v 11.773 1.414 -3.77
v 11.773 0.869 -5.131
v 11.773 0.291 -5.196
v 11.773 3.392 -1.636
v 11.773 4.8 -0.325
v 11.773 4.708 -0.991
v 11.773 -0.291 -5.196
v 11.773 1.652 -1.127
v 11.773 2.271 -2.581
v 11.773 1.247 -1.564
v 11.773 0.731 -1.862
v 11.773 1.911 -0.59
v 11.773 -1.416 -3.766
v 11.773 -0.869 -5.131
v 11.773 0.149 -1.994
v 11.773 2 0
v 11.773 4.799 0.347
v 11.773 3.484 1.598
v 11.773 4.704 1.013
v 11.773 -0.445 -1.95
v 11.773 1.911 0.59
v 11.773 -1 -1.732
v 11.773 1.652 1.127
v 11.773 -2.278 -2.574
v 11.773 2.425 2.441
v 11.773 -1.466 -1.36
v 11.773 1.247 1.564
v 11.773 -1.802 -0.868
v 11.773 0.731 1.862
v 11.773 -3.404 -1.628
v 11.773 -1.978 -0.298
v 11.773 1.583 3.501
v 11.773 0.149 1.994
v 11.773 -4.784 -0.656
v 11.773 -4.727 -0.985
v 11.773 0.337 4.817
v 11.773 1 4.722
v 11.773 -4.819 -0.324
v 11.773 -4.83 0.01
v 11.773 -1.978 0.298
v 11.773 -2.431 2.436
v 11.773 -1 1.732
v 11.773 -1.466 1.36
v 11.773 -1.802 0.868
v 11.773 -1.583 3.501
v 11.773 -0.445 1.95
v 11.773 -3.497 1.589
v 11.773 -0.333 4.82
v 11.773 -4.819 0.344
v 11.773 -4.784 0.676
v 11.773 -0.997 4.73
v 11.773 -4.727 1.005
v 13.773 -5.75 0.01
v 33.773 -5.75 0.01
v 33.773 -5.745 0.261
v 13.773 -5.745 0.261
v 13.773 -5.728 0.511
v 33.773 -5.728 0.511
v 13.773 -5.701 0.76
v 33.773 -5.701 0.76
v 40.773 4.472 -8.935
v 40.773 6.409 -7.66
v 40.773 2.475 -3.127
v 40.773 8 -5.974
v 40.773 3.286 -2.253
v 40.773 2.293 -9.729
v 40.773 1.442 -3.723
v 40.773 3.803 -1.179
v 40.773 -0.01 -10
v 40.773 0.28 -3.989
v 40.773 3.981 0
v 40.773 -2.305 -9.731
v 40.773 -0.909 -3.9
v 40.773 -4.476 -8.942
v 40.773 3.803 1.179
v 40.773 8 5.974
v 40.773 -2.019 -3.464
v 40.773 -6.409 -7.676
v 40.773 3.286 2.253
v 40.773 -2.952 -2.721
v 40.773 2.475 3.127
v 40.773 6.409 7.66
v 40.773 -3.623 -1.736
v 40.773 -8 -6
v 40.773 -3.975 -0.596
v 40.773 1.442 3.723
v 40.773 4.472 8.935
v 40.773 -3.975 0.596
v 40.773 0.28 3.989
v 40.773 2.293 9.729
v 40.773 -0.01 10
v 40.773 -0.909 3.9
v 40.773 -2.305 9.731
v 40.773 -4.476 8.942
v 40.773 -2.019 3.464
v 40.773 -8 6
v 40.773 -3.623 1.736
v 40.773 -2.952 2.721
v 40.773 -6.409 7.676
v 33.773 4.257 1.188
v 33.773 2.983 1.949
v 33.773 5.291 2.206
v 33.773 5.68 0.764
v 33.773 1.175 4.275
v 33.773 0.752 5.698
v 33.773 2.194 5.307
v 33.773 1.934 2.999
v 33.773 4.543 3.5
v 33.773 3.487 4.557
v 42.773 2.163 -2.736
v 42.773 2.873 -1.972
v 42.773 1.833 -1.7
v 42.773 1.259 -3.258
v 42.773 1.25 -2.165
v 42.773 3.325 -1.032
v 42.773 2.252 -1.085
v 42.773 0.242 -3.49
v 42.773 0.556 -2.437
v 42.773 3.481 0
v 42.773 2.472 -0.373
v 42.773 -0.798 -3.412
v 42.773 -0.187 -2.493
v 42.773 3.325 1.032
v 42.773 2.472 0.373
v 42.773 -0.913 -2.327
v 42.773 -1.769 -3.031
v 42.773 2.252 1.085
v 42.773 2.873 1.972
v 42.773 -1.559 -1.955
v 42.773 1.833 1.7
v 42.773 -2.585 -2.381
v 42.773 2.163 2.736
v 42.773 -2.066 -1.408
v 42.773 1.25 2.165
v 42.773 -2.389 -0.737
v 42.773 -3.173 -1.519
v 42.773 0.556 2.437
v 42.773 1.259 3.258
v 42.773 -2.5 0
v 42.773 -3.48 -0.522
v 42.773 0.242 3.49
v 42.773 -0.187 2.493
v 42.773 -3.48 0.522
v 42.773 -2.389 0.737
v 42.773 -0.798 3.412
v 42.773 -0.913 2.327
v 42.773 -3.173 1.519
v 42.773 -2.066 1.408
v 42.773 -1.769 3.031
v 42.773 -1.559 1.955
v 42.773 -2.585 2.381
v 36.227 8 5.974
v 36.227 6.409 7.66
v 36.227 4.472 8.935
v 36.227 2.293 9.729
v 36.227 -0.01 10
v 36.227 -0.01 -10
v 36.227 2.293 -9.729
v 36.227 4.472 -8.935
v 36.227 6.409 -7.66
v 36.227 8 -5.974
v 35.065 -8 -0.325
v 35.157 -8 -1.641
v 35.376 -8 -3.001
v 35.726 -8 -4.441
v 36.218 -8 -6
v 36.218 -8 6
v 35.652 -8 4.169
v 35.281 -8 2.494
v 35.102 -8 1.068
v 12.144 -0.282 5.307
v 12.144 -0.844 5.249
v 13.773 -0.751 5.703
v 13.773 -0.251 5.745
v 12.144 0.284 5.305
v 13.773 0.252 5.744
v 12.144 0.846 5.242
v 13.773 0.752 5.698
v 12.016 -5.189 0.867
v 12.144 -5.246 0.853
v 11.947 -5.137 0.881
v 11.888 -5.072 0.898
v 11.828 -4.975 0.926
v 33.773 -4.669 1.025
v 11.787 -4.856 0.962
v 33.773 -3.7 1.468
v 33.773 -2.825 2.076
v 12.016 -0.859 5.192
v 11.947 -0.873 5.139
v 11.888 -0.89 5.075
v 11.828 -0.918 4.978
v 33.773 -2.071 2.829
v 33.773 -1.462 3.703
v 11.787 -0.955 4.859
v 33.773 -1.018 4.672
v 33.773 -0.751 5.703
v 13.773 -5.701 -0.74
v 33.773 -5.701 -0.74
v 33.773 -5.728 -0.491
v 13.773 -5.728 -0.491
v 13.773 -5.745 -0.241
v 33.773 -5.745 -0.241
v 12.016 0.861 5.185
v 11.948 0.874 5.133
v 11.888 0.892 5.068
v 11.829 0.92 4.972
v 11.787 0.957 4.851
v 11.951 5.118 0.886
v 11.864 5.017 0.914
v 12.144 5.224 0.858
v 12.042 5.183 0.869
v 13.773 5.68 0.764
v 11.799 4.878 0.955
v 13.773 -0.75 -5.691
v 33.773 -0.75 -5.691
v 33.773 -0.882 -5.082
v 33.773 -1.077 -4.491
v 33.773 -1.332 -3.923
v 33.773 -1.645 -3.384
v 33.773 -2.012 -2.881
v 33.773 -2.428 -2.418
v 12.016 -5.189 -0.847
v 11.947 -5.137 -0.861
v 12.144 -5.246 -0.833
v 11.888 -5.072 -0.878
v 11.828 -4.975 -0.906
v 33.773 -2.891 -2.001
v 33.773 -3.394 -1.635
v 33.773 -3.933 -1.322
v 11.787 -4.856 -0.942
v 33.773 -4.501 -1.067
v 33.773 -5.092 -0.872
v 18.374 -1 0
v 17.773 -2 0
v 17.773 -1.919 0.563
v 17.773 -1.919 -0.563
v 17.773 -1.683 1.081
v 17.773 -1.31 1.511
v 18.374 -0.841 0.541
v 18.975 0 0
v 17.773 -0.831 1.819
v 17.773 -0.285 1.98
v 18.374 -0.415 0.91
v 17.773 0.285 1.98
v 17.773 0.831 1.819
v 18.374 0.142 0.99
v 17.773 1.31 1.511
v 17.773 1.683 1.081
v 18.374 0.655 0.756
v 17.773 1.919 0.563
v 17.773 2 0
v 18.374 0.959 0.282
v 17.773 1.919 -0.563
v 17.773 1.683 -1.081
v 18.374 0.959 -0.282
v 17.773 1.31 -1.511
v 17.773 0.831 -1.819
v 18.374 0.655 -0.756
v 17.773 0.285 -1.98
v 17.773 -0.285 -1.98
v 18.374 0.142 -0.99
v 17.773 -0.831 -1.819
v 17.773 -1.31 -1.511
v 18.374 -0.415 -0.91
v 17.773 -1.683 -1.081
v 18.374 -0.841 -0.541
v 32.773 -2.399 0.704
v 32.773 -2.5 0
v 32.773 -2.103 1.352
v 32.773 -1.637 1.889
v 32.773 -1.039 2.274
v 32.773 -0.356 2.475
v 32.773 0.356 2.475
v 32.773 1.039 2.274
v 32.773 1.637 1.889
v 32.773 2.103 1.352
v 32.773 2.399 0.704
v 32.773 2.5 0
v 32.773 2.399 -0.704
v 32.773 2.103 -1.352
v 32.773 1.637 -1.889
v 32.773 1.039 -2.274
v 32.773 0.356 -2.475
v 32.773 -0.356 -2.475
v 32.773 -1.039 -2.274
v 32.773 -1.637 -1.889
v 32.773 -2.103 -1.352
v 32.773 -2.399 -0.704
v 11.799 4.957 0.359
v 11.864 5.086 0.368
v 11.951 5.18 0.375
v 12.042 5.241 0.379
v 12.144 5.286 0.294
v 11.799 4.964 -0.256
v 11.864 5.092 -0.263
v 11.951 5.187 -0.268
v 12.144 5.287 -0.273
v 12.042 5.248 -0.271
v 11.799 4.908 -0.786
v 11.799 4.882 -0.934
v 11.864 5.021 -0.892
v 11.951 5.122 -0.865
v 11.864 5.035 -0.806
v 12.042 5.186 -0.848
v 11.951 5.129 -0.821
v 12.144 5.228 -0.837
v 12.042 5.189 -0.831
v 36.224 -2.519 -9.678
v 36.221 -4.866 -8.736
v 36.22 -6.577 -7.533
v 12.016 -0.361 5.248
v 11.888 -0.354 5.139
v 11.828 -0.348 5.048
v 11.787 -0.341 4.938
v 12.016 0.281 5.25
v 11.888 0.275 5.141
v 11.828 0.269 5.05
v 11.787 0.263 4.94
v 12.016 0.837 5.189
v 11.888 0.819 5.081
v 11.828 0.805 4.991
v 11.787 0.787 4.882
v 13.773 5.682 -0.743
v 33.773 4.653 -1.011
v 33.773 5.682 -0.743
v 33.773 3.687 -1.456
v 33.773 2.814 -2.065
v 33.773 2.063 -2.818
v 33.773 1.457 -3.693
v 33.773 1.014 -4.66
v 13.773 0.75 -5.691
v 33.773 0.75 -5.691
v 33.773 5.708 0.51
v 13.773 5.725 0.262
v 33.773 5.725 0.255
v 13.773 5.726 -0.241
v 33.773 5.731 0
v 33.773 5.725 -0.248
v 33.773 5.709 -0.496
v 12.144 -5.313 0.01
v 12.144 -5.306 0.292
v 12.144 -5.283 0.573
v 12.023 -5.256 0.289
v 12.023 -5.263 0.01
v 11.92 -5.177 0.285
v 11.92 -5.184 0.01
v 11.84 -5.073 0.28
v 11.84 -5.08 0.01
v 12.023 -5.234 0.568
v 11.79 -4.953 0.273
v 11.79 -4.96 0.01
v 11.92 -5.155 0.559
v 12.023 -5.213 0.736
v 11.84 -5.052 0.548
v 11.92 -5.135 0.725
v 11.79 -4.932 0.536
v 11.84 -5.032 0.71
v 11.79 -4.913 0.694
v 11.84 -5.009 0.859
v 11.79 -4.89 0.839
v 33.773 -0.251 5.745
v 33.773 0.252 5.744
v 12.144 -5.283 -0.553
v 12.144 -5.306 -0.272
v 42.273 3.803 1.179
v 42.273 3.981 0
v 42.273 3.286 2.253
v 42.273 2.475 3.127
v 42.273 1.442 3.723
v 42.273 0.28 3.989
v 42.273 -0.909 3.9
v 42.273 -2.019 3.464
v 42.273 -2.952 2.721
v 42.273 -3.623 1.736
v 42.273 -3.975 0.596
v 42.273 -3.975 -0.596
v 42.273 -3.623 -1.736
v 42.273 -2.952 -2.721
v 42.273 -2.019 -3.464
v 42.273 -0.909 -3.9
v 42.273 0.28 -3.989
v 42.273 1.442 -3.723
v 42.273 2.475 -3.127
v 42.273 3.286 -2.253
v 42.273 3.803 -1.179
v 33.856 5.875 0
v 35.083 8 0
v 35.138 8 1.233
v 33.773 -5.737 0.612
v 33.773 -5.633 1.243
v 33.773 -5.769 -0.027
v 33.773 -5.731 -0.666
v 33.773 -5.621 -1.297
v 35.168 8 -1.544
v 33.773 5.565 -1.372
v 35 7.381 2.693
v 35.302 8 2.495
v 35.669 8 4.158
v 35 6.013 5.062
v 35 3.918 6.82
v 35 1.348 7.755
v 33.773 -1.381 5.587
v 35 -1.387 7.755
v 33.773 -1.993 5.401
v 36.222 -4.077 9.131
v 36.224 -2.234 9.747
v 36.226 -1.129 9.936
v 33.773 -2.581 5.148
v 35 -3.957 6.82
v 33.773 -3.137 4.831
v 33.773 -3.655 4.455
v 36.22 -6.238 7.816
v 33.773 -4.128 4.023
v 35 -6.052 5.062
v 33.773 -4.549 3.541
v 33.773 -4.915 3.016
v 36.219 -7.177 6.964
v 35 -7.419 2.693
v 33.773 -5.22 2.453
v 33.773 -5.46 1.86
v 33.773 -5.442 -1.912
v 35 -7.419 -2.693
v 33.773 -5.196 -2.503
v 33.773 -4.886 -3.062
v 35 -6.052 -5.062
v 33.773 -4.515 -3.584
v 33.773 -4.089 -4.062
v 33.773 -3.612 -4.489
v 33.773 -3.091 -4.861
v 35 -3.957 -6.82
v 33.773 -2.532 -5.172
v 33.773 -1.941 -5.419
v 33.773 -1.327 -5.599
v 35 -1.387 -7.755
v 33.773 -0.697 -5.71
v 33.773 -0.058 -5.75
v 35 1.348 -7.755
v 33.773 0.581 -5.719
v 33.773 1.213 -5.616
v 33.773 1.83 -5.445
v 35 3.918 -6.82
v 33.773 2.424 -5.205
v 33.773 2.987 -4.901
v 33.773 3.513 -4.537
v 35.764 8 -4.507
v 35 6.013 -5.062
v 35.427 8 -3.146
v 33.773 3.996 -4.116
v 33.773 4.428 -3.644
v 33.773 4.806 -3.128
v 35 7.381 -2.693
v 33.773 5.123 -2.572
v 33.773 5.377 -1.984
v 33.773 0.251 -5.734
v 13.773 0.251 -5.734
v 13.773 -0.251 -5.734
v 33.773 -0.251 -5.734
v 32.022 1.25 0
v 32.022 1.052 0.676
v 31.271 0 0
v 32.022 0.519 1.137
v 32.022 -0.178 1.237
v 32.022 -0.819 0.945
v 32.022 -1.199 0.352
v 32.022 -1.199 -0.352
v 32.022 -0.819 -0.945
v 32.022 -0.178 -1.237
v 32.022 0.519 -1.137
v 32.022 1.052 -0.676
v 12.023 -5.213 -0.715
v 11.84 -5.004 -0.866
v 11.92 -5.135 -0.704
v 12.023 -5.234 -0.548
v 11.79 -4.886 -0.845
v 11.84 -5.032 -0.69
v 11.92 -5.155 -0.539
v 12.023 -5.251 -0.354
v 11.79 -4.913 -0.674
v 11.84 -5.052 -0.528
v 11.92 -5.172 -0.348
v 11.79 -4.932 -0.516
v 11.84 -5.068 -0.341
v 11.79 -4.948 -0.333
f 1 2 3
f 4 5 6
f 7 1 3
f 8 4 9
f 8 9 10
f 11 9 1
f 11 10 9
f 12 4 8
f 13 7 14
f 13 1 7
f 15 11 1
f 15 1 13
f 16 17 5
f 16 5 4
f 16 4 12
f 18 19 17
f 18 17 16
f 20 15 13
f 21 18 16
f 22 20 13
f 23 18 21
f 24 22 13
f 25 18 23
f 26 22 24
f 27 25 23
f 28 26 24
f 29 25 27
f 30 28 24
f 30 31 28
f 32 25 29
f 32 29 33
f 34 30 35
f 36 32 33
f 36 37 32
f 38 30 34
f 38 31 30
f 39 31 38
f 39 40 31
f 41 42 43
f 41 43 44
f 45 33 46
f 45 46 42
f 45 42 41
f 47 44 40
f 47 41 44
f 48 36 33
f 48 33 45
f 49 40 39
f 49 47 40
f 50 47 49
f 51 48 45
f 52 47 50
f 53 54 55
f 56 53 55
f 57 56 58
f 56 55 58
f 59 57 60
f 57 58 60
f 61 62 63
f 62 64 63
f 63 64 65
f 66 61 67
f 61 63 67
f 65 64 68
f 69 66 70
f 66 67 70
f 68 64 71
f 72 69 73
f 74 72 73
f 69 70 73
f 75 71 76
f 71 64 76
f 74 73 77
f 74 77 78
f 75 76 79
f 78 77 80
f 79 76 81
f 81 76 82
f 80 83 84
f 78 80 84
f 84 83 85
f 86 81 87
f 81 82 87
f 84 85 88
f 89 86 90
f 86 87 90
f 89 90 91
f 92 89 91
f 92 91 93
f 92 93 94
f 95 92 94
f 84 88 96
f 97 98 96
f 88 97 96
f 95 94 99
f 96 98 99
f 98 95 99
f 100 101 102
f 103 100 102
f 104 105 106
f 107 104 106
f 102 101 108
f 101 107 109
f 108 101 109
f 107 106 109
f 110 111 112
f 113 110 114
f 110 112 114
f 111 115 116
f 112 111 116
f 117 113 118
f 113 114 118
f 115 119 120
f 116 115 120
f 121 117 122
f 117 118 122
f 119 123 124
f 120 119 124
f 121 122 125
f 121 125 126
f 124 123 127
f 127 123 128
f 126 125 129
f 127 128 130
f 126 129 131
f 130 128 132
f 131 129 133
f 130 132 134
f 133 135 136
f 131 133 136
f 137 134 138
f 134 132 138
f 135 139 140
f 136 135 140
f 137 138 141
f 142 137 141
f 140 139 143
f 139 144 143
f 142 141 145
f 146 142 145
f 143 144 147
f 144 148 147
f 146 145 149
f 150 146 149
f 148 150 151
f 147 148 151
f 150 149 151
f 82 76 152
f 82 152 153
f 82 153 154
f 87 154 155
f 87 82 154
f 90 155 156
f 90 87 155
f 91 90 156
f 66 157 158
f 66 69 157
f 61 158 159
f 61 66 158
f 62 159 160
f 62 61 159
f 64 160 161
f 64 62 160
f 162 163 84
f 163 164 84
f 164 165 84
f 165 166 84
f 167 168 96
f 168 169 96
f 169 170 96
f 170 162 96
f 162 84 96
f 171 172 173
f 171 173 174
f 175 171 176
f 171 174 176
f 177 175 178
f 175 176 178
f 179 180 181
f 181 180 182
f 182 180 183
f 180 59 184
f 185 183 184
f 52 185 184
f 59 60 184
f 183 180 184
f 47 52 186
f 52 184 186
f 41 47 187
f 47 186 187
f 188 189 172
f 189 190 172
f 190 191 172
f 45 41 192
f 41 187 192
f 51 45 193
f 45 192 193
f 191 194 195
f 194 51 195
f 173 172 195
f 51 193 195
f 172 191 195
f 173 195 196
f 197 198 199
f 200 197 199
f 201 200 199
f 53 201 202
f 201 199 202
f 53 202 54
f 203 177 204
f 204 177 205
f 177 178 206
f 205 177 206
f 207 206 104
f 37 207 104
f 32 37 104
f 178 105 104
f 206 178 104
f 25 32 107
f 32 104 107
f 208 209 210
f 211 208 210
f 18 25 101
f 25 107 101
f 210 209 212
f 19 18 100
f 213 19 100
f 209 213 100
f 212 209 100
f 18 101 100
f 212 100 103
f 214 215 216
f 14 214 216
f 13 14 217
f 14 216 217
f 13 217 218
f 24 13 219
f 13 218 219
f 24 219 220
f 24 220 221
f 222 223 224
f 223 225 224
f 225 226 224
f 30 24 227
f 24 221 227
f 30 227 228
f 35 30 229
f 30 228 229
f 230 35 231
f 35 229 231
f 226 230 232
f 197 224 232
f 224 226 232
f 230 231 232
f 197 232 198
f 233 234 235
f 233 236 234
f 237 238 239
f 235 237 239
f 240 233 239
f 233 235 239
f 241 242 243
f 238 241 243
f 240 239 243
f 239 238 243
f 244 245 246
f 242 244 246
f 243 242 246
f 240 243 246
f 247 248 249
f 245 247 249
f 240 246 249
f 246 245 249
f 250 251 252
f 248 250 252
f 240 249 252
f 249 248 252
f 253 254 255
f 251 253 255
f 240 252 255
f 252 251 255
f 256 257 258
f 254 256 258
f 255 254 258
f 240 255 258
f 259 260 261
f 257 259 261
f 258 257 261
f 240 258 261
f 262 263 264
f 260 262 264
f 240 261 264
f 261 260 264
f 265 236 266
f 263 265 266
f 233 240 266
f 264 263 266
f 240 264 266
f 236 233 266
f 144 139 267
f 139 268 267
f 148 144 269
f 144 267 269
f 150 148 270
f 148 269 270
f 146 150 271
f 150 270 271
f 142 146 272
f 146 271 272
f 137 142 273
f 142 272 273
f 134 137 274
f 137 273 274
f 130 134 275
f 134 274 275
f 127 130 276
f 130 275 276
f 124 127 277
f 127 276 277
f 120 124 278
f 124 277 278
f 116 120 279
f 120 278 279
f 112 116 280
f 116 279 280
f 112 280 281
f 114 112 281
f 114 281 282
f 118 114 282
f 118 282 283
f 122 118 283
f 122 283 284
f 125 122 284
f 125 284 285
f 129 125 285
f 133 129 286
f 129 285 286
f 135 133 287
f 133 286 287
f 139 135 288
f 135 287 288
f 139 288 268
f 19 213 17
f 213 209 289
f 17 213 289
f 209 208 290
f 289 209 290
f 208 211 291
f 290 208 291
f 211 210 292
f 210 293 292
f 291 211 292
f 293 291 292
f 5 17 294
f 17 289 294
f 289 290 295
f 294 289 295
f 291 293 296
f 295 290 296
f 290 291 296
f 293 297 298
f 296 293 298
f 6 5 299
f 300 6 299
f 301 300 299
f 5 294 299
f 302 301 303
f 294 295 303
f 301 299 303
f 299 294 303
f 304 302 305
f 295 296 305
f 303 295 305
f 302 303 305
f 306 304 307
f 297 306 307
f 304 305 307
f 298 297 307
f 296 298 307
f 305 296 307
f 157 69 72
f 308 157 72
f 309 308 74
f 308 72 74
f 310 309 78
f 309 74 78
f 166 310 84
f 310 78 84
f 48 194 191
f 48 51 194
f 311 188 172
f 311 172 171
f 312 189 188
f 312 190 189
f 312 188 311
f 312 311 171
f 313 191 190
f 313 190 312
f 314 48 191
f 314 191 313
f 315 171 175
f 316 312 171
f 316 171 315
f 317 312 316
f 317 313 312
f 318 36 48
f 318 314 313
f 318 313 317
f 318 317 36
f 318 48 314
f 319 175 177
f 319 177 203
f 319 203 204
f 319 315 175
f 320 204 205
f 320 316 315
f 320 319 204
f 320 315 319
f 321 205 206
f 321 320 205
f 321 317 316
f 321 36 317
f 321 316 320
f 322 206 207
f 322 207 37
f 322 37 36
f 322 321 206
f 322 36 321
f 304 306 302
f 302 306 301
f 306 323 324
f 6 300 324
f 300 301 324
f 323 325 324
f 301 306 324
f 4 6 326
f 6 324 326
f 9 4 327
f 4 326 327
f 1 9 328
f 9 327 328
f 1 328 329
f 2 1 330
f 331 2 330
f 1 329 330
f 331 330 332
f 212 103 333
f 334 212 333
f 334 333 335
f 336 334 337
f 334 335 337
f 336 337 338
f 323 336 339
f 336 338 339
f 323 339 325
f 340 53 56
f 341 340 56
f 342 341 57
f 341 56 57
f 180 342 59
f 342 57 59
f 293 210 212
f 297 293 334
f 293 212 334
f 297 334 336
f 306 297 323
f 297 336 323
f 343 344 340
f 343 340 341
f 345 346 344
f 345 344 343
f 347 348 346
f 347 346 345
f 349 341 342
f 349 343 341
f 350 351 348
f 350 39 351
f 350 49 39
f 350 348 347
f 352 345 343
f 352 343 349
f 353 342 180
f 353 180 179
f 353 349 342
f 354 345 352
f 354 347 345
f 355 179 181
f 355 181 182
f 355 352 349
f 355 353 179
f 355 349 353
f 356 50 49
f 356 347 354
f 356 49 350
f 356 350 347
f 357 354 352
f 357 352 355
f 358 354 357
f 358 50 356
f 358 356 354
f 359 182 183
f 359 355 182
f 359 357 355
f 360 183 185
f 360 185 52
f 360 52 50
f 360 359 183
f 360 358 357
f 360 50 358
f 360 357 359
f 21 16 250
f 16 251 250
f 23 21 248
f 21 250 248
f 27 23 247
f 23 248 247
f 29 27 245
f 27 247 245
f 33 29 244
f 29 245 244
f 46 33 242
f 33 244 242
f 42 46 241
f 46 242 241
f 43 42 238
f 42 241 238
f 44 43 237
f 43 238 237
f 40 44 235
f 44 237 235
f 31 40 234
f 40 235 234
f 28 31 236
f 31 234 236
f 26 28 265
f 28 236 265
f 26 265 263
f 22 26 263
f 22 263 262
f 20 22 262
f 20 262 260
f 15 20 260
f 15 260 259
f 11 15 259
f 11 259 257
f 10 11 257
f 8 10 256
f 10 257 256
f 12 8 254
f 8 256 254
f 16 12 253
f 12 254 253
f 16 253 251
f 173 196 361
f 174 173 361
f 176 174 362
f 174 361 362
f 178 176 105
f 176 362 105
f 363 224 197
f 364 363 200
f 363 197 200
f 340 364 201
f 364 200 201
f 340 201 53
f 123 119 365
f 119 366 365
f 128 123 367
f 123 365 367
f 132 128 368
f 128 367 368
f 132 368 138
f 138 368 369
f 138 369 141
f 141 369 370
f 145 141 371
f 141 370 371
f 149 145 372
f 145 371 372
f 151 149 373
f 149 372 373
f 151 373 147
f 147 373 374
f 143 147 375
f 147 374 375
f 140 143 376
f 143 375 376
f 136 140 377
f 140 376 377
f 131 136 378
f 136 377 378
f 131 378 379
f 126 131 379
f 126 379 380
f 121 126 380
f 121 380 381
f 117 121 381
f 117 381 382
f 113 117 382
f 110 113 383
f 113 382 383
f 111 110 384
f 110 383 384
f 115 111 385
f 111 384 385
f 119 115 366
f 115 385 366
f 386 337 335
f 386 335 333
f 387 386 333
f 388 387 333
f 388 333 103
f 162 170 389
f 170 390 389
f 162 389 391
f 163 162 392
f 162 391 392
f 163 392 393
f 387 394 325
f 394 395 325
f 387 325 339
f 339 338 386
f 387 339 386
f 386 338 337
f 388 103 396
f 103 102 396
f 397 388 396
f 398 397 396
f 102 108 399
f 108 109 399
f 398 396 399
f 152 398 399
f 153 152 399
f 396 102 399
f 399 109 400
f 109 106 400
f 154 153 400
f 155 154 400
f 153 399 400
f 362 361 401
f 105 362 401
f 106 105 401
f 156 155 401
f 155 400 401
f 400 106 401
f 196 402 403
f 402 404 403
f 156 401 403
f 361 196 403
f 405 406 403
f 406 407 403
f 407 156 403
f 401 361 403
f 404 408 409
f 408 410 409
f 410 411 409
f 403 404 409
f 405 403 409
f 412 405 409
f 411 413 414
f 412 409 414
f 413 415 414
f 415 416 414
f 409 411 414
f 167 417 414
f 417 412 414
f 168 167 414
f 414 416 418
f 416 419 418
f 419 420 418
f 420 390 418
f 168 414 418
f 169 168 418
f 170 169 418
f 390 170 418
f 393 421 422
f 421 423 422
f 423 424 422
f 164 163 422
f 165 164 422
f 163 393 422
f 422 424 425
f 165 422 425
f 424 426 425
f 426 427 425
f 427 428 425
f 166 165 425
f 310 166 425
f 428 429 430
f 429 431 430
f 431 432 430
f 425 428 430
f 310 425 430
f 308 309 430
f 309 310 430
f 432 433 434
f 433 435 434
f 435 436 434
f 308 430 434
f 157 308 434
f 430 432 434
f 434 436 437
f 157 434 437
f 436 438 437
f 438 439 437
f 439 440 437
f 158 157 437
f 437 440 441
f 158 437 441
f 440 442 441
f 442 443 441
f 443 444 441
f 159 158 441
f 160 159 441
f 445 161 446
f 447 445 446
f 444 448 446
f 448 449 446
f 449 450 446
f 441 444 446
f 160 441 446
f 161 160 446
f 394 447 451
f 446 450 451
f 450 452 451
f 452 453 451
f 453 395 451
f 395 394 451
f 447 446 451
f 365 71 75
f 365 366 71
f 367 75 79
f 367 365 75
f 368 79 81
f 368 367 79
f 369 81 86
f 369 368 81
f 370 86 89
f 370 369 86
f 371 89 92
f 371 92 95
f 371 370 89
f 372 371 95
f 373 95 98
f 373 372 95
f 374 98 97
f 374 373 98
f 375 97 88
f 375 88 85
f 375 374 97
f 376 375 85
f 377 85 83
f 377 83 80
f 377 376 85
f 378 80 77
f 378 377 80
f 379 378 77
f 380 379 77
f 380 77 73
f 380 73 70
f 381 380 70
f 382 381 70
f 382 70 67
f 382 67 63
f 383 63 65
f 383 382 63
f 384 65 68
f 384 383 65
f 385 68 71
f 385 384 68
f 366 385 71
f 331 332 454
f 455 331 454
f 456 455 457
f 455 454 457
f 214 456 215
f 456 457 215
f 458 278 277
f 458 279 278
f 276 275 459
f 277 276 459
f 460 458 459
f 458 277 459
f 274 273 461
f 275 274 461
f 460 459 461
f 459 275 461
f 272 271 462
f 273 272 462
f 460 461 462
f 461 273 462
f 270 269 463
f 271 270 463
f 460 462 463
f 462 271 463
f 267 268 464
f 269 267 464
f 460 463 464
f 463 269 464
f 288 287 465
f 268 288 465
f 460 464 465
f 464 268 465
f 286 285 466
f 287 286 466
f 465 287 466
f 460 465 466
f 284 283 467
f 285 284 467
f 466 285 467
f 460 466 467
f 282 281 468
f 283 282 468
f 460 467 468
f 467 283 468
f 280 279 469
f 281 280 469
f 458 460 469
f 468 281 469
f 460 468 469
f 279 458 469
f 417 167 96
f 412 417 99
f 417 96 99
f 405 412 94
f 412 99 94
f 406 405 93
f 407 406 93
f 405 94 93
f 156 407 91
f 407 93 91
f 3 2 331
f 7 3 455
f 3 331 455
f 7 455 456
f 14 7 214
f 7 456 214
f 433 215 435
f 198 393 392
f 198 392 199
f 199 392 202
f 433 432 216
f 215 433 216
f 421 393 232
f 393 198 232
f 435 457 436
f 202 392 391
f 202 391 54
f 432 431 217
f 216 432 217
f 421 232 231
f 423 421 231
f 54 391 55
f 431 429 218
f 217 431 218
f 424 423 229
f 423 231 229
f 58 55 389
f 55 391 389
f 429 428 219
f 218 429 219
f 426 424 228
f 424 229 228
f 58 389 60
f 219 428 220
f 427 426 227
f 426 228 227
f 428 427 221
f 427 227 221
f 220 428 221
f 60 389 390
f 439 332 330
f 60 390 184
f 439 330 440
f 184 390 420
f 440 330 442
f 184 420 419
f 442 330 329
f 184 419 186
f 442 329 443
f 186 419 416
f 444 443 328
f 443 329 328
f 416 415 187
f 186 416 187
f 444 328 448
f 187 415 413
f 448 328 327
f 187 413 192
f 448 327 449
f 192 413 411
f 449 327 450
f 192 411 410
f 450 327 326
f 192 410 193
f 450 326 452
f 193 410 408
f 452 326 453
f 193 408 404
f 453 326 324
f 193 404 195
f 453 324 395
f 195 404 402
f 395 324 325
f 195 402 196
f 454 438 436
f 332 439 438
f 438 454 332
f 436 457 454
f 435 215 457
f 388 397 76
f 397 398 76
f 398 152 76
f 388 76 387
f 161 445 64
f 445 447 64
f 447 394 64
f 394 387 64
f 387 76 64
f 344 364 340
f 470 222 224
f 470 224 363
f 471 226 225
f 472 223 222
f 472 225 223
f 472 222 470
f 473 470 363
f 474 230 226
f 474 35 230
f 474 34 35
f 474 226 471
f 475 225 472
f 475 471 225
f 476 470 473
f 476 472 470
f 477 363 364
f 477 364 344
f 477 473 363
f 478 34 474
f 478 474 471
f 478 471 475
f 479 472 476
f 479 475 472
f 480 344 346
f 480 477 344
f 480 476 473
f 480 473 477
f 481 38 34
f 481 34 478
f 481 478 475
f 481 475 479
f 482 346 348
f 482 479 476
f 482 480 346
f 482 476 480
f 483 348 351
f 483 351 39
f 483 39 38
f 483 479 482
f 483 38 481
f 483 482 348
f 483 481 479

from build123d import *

# Parameters (mm, degrees)
F0_W      = 1.5
F0_H      = 1.5
F0_W_2    = 0.5
F0_H_2    = 0.435
F0_W_3    = 4.546262
F0_H_3    = 4
F0_H_4    = 2.065
F4_DEPTH  = 22
F5_SIZE2  = 2
F5_SIZE   = 0.5358983849
F6_R      = 0.5
F8_D      = 5
F8_DEPTH  = 10
F8_TIP    = 1.5021515476
F10_D     = 4
F10_DEPTH = 6
F10_TIP   = 1.2017212381
F12_DEPTH = 25


# Not quite as in the source:
# - ends of sketch curves that miss each other by under 0.0002 mm in the source are joined


with BuildPart() as f1:
    # F0 (on Top) → F1 (revolve)
    with BuildSketch(Plane.XY):
        with Locations((41.523095, 3.230684)):
            Rectangle(F0_W, F0_H)
        Polygon((33.773095, 5.681561), (33.773095, 2.480684), (37.5528260833, 2.480684), (36.226833, 5.980684), (36.226833, 9.980684), (33.773095, 5.730684), align=None)
        Polygon((36.226833, 5.980684), (37.5528260833, 2.480684), (39.4471019167, 2.480684), (40.773095, 5.980684), align=None)
        with Locations((42.523095, 2.263184)):
            Rectangle(F0_W_2, F0_H_2)
        Polygon((40.773095, 5.980684), (39.4471019167, 2.480684), (40.773095, 2.480684), (40.773095, 3.980684), align=None)
        with Locations((41.523095, 2.263184)):
            Rectangle(F0_W, F0_H_2)
        Polygon((42.273095, 3.980684), (42.273095, 2.480684), (42.773095, 2.480684), (42.773095, 3.480684), align=None)
        with Locations((38.499964, 7.980684)):
            Rectangle(F0_W_3, F0_H_3)
        with BuildLine():
            Line((40.773095, 2.045684), (40.773095, 0.7342315134))
            add(Edge.make_bspline(
                [(42.226833, -0.0193156), (42.2268322283, 0.4093938973), (40.773095, 0.7342315134)],
                knots=[3.141593, 3.141593, 3.141593, 3.8525916266, 3.8525916266, 3.8525916266], degree=2, weights=[1, 0.9374728154, 1]))
            Line((42.226833, -0.0193156), (42.273095, -0.019316))
            Line((42.273095, -0.019316), (42.273095, 2.045684))
            Line((42.273095, 2.045684), (40.773095, 2.045684))
        make_face()
        with Locations((42.523095, 1.013184)):
            Rectangle(F0_W_2, F0_H_4)
        Polygon((39.4471019167, 2.480684), (39.2822999192, 2.045684), (40.773095, 2.045684), (40.773095, 2.480684), align=None)
        with BuildLine():
            Line((33.773095, 0.730684), (33.773095, -0.019316))
            Line((33.773095, -0.019316), (34.273095, -0.019316))
            Line((34.273095, -0.019316), (38.499964, -0.019316))
            Line((38.499964, -0.019316), (38.0839828646, 1.0786791495))
            add(Edge.make_bspline(
                [(38.0839828646, 1.0786791495), (35.8841941746, 1.2164838646), (33.773095, 1.0344109623)],
                knots=[4.3976955436, 4.3976955436, 4.3976955436, 5.1336990724, 5.1336990724, 5.1336990724], degree=2, weights=[1, 0.9330480766, 1]))
            Line((33.773095, 1.0344109623), (33.773095, 0.730684))
        make_face()
        with BuildLine():
            Line((33.773095, 2.045684), (33.773095, 1.0344109623))
            add(Edge.make_bspline(
                [(38.0839828646, 1.0786791495), (35.8841941746, 1.2164838646), (33.773095, 1.0344109623)],
                knots=[4.3976955436, 4.3976955436, 4.3976955436, 5.1336990724, 5.1336990724, 5.1336990724], degree=2, weights=[1, 0.9330480766, 1]))
            Line((38.0839828646, 1.0786791495), (37.7176280808, 2.045684))
            Line((37.7176280808, 2.045684), (33.773095, 2.045684))
        make_face()
        Polygon((33.773095, 2.480684), (33.773095, 2.045684), (37.7176280808, 2.045684), (37.5528260833, 2.480684), align=None)
        with BuildLine():
            Line((37.7176280808, 2.045684), (38.0839828646, 1.0786791495))
            add(Edge.make_bspline(
                [(38.8919051119, 1.0152247595), (38.499964, 1.0526202094), (38.0839828646, 1.0786791495)],
                knots=[4.2521316371, 4.2521316371, 4.2521316371, 4.3976955436, 4.3976955436, 4.3976955436], degree=2, weights=[1, 0.9973525626, 1]))
            Line((38.8919051119, 1.0152247595), (39.2822999192, 2.045684))
            Line((39.2822999192, 2.045684), (37.7176280808, 2.045684))
        make_face()
        with BuildLine():
            Line((38.0839828646, 1.0786791495), (38.499964, -0.019316))
            Line((38.499964, -0.019316), (38.8919051119, 1.0152247595))
            add(Edge.make_bspline(
                [(38.8919051119, 1.0152247595), (38.499964, 1.0526202094), (38.0839828646, 1.0786791495)],
                knots=[4.2521316371, 4.2521316371, 4.2521316371, 4.3976955436, 4.3976955436, 4.3976955436], degree=2, weights=[1, 0.9973525626, 1]))
        make_face()
        with BuildLine():
            Line((38.8919051119, 1.0152247595), (38.499964, -0.019316))
            Line((38.499964, -0.019316), (40.773095, -0.019316))
            Line((40.773095, -0.019316), (40.773095, 0.7342315134))
            add(Edge.make_bspline(
                [(40.773095, 0.7342315134), (39.9803120127, 0.9113788897), (38.8919051119, 1.0152247595)],
                knots=[3.8525916266, 3.8525916266, 3.8525916266, 4.2521316371, 4.2521316371, 4.2521316371], degree=2, weights=[1, 0.9801122448, 1]))
        make_face()
        Polygon((37.5528260833, 2.480684), (37.7176280808, 2.045684), (39.2822999192, 2.045684), (39.4471019167, 2.480684), align=None)
        with BuildLine():
            Line((39.2822999192, 2.045684), (38.8919051119, 1.0152247595))
            add(Edge.make_bspline(
                [(40.773095, 0.7342315134), (39.9803120127, 0.9113788897), (38.8919051119, 1.0152247595)],
                knots=[3.8525916266, 3.8525916266, 3.8525916266, 4.2521316371, 4.2521316371, 4.2521316371], degree=2, weights=[1, 0.9801122448, 1]))
            Line((40.773095, 0.7342315134), (40.773095, 2.045684))
            Line((40.773095, 2.045684), (39.2822999192, 2.045684))
        make_face()
        with BuildLine():
            Line((40.773095, 0.7342315134), (40.773095, -0.019316))
            Line((40.773095, -0.019316), (42.226833, -0.019316))
            add(Edge.make_bspline(
                [(42.226833, -0.019316), (42.2268322283, 0.4093938973), (40.773095, 0.7342315134)],
                knots=[3.141593, 3.141593, 3.141593, 3.8525916266, 3.8525916266, 3.8525916266], degree=2, weights=[1, 0.9374728154, 1]))
        make_face()
    revolve(axis=Axis((20.5738751867, -0.019316, 0), (1, 0, 0)))

    # F3 (on face) → F4 (join)
    with BuildSketch(Plane(origin=(33.773095, 0, 0), x_dir=(0, -1, 0), z_dir=(-1, 0, 0))):
        with BuildLine():
            ThreePointArc((0.7512693785, 5.7032222692), (-0.000602262, 5.749965501), (-0.7521320187, 5.698014387))
            ThreePointArc((-0.7521320187, 5.698014387), (-2.4254688054, 2.4414028529), (-5.6797608355, 0.7635595739))
            ThreePointArc((-5.6797608355, 0.7635595739), (-5.7306746348, 0.0103778617), (-5.6824799161, -0.7429827264))
            ThreePointArc((-5.6824799161, -0.7429827264), (-2.4218166649, -2.4249412056), (-0.7499999869, -5.6908159978))
            ThreePointArc((-0.7499999869, -5.6908159978), (0, -5.739939), (0.7500000036, -5.690816125))
            ThreePointArc((0.7500000036, -5.690816125), (2.4284043129, -2.4183433129), (5.7008769978, -0.7399389869))
            ThreePointArc((5.7008769978, -0.7399389869), (5.7377061387, -0.3657424933), (5.75, 0.010061))
            ThreePointArc((5.75, 0.010061), (5.7377061387, 0.3858644933), (5.700877125, 0.7600610036))
            ThreePointArc((5.700877125, 0.7600610036), (2.4311698073, 2.43570162), (0.7512693785, 5.7032222692))
        make_face()
    extrude(amount=F4_DEPTH)

    # F5
    f5_edges = [f1.edges().sort_by_distance(p)[0] for p in [
        (11.773095, 0.000602, 5.749966),
        (11.773095, -5.737706, 0.385864),
        (11.773095, 0, -5.739939),
        (11.773095, 5.730675, 0.010378),
    ]]
    f5_side = f1.faces().sort_by_distance((11.773095, -0.002803, 0.008597))[0]
    chamfer(f5_edges, length=F5_SIZE, length2=F5_SIZE2, reference=f5_side)

    # F6
    f6_edges = [f1.edges().sort_by_distance(p)[0] for p in [
        (11.773095, 0.001201, 5.214061),
        (11.773095, 5.194775, 0.010692),
        (11.773095, -5.195822, 0.446281),
    ]]
    fillet(f6_edges, radius=F6_R)

    # F8
    with Locations(Plane.YZ.offset(42.773095)):
        with Locations((0, 0)):
            Hole(F8_D / 2, depth=F8_DEPTH)
            with Locations((0, 0, -(F8_DEPTH + F8_TIP / 2))):  # 118° drill point
                Cone(0, F8_D / 2, F8_TIP, mode=Mode.SUBTRACT)

    # F10
    with Locations(Plane(origin=(11.773095, 0, 0), x_dir=(0, -1, 0), z_dir=(-1, 0, 0))):
        with Locations((0, 0)):
            Hole(F10_D / 2, depth=F10_DEPTH)
            with Locations((0, 0, -(F10_DEPTH + F10_TIP / 2))):  # 118° drill point
                Cone(0, F10_D / 2, F10_TIP, mode=Mode.SUBTRACT)

    # F11 (on face) → F12 (cut)
    with BuildSketch(Plane.YZ.offset(40.773095)):
        with BuildLine():
            ThreePointArc((8, -5.9741585928), (9.4726058286, -3.1469699713), (9.980684, 0))
            ThreePointArc((9.980684, 0), (9.4726058286, 3.1469699713), (8, 5.9741585928))
            Line((8, 5.9741585928), (8, -5.9741585928))
        make_face()
        with BuildLine():
            ThreePointArc((-8, 6), (-4.476454623, 8.9421112724), (-0.009658, 9.9999953362))
            ThreePointArc((-0.009658, 9.9999953362), (-10.019316, 0), (-0.009658, -9.9999953362))
            ThreePointArc((-0.009658, -9.9999953362), (-4.476454623, -8.9421112724), (-8, -6))
            Line((-8, -6), (-8, 6))
        make_face()
    extrude(amount=-F12_DEPTH, mode=Mode.SUBTRACT)


solid = f1.part
